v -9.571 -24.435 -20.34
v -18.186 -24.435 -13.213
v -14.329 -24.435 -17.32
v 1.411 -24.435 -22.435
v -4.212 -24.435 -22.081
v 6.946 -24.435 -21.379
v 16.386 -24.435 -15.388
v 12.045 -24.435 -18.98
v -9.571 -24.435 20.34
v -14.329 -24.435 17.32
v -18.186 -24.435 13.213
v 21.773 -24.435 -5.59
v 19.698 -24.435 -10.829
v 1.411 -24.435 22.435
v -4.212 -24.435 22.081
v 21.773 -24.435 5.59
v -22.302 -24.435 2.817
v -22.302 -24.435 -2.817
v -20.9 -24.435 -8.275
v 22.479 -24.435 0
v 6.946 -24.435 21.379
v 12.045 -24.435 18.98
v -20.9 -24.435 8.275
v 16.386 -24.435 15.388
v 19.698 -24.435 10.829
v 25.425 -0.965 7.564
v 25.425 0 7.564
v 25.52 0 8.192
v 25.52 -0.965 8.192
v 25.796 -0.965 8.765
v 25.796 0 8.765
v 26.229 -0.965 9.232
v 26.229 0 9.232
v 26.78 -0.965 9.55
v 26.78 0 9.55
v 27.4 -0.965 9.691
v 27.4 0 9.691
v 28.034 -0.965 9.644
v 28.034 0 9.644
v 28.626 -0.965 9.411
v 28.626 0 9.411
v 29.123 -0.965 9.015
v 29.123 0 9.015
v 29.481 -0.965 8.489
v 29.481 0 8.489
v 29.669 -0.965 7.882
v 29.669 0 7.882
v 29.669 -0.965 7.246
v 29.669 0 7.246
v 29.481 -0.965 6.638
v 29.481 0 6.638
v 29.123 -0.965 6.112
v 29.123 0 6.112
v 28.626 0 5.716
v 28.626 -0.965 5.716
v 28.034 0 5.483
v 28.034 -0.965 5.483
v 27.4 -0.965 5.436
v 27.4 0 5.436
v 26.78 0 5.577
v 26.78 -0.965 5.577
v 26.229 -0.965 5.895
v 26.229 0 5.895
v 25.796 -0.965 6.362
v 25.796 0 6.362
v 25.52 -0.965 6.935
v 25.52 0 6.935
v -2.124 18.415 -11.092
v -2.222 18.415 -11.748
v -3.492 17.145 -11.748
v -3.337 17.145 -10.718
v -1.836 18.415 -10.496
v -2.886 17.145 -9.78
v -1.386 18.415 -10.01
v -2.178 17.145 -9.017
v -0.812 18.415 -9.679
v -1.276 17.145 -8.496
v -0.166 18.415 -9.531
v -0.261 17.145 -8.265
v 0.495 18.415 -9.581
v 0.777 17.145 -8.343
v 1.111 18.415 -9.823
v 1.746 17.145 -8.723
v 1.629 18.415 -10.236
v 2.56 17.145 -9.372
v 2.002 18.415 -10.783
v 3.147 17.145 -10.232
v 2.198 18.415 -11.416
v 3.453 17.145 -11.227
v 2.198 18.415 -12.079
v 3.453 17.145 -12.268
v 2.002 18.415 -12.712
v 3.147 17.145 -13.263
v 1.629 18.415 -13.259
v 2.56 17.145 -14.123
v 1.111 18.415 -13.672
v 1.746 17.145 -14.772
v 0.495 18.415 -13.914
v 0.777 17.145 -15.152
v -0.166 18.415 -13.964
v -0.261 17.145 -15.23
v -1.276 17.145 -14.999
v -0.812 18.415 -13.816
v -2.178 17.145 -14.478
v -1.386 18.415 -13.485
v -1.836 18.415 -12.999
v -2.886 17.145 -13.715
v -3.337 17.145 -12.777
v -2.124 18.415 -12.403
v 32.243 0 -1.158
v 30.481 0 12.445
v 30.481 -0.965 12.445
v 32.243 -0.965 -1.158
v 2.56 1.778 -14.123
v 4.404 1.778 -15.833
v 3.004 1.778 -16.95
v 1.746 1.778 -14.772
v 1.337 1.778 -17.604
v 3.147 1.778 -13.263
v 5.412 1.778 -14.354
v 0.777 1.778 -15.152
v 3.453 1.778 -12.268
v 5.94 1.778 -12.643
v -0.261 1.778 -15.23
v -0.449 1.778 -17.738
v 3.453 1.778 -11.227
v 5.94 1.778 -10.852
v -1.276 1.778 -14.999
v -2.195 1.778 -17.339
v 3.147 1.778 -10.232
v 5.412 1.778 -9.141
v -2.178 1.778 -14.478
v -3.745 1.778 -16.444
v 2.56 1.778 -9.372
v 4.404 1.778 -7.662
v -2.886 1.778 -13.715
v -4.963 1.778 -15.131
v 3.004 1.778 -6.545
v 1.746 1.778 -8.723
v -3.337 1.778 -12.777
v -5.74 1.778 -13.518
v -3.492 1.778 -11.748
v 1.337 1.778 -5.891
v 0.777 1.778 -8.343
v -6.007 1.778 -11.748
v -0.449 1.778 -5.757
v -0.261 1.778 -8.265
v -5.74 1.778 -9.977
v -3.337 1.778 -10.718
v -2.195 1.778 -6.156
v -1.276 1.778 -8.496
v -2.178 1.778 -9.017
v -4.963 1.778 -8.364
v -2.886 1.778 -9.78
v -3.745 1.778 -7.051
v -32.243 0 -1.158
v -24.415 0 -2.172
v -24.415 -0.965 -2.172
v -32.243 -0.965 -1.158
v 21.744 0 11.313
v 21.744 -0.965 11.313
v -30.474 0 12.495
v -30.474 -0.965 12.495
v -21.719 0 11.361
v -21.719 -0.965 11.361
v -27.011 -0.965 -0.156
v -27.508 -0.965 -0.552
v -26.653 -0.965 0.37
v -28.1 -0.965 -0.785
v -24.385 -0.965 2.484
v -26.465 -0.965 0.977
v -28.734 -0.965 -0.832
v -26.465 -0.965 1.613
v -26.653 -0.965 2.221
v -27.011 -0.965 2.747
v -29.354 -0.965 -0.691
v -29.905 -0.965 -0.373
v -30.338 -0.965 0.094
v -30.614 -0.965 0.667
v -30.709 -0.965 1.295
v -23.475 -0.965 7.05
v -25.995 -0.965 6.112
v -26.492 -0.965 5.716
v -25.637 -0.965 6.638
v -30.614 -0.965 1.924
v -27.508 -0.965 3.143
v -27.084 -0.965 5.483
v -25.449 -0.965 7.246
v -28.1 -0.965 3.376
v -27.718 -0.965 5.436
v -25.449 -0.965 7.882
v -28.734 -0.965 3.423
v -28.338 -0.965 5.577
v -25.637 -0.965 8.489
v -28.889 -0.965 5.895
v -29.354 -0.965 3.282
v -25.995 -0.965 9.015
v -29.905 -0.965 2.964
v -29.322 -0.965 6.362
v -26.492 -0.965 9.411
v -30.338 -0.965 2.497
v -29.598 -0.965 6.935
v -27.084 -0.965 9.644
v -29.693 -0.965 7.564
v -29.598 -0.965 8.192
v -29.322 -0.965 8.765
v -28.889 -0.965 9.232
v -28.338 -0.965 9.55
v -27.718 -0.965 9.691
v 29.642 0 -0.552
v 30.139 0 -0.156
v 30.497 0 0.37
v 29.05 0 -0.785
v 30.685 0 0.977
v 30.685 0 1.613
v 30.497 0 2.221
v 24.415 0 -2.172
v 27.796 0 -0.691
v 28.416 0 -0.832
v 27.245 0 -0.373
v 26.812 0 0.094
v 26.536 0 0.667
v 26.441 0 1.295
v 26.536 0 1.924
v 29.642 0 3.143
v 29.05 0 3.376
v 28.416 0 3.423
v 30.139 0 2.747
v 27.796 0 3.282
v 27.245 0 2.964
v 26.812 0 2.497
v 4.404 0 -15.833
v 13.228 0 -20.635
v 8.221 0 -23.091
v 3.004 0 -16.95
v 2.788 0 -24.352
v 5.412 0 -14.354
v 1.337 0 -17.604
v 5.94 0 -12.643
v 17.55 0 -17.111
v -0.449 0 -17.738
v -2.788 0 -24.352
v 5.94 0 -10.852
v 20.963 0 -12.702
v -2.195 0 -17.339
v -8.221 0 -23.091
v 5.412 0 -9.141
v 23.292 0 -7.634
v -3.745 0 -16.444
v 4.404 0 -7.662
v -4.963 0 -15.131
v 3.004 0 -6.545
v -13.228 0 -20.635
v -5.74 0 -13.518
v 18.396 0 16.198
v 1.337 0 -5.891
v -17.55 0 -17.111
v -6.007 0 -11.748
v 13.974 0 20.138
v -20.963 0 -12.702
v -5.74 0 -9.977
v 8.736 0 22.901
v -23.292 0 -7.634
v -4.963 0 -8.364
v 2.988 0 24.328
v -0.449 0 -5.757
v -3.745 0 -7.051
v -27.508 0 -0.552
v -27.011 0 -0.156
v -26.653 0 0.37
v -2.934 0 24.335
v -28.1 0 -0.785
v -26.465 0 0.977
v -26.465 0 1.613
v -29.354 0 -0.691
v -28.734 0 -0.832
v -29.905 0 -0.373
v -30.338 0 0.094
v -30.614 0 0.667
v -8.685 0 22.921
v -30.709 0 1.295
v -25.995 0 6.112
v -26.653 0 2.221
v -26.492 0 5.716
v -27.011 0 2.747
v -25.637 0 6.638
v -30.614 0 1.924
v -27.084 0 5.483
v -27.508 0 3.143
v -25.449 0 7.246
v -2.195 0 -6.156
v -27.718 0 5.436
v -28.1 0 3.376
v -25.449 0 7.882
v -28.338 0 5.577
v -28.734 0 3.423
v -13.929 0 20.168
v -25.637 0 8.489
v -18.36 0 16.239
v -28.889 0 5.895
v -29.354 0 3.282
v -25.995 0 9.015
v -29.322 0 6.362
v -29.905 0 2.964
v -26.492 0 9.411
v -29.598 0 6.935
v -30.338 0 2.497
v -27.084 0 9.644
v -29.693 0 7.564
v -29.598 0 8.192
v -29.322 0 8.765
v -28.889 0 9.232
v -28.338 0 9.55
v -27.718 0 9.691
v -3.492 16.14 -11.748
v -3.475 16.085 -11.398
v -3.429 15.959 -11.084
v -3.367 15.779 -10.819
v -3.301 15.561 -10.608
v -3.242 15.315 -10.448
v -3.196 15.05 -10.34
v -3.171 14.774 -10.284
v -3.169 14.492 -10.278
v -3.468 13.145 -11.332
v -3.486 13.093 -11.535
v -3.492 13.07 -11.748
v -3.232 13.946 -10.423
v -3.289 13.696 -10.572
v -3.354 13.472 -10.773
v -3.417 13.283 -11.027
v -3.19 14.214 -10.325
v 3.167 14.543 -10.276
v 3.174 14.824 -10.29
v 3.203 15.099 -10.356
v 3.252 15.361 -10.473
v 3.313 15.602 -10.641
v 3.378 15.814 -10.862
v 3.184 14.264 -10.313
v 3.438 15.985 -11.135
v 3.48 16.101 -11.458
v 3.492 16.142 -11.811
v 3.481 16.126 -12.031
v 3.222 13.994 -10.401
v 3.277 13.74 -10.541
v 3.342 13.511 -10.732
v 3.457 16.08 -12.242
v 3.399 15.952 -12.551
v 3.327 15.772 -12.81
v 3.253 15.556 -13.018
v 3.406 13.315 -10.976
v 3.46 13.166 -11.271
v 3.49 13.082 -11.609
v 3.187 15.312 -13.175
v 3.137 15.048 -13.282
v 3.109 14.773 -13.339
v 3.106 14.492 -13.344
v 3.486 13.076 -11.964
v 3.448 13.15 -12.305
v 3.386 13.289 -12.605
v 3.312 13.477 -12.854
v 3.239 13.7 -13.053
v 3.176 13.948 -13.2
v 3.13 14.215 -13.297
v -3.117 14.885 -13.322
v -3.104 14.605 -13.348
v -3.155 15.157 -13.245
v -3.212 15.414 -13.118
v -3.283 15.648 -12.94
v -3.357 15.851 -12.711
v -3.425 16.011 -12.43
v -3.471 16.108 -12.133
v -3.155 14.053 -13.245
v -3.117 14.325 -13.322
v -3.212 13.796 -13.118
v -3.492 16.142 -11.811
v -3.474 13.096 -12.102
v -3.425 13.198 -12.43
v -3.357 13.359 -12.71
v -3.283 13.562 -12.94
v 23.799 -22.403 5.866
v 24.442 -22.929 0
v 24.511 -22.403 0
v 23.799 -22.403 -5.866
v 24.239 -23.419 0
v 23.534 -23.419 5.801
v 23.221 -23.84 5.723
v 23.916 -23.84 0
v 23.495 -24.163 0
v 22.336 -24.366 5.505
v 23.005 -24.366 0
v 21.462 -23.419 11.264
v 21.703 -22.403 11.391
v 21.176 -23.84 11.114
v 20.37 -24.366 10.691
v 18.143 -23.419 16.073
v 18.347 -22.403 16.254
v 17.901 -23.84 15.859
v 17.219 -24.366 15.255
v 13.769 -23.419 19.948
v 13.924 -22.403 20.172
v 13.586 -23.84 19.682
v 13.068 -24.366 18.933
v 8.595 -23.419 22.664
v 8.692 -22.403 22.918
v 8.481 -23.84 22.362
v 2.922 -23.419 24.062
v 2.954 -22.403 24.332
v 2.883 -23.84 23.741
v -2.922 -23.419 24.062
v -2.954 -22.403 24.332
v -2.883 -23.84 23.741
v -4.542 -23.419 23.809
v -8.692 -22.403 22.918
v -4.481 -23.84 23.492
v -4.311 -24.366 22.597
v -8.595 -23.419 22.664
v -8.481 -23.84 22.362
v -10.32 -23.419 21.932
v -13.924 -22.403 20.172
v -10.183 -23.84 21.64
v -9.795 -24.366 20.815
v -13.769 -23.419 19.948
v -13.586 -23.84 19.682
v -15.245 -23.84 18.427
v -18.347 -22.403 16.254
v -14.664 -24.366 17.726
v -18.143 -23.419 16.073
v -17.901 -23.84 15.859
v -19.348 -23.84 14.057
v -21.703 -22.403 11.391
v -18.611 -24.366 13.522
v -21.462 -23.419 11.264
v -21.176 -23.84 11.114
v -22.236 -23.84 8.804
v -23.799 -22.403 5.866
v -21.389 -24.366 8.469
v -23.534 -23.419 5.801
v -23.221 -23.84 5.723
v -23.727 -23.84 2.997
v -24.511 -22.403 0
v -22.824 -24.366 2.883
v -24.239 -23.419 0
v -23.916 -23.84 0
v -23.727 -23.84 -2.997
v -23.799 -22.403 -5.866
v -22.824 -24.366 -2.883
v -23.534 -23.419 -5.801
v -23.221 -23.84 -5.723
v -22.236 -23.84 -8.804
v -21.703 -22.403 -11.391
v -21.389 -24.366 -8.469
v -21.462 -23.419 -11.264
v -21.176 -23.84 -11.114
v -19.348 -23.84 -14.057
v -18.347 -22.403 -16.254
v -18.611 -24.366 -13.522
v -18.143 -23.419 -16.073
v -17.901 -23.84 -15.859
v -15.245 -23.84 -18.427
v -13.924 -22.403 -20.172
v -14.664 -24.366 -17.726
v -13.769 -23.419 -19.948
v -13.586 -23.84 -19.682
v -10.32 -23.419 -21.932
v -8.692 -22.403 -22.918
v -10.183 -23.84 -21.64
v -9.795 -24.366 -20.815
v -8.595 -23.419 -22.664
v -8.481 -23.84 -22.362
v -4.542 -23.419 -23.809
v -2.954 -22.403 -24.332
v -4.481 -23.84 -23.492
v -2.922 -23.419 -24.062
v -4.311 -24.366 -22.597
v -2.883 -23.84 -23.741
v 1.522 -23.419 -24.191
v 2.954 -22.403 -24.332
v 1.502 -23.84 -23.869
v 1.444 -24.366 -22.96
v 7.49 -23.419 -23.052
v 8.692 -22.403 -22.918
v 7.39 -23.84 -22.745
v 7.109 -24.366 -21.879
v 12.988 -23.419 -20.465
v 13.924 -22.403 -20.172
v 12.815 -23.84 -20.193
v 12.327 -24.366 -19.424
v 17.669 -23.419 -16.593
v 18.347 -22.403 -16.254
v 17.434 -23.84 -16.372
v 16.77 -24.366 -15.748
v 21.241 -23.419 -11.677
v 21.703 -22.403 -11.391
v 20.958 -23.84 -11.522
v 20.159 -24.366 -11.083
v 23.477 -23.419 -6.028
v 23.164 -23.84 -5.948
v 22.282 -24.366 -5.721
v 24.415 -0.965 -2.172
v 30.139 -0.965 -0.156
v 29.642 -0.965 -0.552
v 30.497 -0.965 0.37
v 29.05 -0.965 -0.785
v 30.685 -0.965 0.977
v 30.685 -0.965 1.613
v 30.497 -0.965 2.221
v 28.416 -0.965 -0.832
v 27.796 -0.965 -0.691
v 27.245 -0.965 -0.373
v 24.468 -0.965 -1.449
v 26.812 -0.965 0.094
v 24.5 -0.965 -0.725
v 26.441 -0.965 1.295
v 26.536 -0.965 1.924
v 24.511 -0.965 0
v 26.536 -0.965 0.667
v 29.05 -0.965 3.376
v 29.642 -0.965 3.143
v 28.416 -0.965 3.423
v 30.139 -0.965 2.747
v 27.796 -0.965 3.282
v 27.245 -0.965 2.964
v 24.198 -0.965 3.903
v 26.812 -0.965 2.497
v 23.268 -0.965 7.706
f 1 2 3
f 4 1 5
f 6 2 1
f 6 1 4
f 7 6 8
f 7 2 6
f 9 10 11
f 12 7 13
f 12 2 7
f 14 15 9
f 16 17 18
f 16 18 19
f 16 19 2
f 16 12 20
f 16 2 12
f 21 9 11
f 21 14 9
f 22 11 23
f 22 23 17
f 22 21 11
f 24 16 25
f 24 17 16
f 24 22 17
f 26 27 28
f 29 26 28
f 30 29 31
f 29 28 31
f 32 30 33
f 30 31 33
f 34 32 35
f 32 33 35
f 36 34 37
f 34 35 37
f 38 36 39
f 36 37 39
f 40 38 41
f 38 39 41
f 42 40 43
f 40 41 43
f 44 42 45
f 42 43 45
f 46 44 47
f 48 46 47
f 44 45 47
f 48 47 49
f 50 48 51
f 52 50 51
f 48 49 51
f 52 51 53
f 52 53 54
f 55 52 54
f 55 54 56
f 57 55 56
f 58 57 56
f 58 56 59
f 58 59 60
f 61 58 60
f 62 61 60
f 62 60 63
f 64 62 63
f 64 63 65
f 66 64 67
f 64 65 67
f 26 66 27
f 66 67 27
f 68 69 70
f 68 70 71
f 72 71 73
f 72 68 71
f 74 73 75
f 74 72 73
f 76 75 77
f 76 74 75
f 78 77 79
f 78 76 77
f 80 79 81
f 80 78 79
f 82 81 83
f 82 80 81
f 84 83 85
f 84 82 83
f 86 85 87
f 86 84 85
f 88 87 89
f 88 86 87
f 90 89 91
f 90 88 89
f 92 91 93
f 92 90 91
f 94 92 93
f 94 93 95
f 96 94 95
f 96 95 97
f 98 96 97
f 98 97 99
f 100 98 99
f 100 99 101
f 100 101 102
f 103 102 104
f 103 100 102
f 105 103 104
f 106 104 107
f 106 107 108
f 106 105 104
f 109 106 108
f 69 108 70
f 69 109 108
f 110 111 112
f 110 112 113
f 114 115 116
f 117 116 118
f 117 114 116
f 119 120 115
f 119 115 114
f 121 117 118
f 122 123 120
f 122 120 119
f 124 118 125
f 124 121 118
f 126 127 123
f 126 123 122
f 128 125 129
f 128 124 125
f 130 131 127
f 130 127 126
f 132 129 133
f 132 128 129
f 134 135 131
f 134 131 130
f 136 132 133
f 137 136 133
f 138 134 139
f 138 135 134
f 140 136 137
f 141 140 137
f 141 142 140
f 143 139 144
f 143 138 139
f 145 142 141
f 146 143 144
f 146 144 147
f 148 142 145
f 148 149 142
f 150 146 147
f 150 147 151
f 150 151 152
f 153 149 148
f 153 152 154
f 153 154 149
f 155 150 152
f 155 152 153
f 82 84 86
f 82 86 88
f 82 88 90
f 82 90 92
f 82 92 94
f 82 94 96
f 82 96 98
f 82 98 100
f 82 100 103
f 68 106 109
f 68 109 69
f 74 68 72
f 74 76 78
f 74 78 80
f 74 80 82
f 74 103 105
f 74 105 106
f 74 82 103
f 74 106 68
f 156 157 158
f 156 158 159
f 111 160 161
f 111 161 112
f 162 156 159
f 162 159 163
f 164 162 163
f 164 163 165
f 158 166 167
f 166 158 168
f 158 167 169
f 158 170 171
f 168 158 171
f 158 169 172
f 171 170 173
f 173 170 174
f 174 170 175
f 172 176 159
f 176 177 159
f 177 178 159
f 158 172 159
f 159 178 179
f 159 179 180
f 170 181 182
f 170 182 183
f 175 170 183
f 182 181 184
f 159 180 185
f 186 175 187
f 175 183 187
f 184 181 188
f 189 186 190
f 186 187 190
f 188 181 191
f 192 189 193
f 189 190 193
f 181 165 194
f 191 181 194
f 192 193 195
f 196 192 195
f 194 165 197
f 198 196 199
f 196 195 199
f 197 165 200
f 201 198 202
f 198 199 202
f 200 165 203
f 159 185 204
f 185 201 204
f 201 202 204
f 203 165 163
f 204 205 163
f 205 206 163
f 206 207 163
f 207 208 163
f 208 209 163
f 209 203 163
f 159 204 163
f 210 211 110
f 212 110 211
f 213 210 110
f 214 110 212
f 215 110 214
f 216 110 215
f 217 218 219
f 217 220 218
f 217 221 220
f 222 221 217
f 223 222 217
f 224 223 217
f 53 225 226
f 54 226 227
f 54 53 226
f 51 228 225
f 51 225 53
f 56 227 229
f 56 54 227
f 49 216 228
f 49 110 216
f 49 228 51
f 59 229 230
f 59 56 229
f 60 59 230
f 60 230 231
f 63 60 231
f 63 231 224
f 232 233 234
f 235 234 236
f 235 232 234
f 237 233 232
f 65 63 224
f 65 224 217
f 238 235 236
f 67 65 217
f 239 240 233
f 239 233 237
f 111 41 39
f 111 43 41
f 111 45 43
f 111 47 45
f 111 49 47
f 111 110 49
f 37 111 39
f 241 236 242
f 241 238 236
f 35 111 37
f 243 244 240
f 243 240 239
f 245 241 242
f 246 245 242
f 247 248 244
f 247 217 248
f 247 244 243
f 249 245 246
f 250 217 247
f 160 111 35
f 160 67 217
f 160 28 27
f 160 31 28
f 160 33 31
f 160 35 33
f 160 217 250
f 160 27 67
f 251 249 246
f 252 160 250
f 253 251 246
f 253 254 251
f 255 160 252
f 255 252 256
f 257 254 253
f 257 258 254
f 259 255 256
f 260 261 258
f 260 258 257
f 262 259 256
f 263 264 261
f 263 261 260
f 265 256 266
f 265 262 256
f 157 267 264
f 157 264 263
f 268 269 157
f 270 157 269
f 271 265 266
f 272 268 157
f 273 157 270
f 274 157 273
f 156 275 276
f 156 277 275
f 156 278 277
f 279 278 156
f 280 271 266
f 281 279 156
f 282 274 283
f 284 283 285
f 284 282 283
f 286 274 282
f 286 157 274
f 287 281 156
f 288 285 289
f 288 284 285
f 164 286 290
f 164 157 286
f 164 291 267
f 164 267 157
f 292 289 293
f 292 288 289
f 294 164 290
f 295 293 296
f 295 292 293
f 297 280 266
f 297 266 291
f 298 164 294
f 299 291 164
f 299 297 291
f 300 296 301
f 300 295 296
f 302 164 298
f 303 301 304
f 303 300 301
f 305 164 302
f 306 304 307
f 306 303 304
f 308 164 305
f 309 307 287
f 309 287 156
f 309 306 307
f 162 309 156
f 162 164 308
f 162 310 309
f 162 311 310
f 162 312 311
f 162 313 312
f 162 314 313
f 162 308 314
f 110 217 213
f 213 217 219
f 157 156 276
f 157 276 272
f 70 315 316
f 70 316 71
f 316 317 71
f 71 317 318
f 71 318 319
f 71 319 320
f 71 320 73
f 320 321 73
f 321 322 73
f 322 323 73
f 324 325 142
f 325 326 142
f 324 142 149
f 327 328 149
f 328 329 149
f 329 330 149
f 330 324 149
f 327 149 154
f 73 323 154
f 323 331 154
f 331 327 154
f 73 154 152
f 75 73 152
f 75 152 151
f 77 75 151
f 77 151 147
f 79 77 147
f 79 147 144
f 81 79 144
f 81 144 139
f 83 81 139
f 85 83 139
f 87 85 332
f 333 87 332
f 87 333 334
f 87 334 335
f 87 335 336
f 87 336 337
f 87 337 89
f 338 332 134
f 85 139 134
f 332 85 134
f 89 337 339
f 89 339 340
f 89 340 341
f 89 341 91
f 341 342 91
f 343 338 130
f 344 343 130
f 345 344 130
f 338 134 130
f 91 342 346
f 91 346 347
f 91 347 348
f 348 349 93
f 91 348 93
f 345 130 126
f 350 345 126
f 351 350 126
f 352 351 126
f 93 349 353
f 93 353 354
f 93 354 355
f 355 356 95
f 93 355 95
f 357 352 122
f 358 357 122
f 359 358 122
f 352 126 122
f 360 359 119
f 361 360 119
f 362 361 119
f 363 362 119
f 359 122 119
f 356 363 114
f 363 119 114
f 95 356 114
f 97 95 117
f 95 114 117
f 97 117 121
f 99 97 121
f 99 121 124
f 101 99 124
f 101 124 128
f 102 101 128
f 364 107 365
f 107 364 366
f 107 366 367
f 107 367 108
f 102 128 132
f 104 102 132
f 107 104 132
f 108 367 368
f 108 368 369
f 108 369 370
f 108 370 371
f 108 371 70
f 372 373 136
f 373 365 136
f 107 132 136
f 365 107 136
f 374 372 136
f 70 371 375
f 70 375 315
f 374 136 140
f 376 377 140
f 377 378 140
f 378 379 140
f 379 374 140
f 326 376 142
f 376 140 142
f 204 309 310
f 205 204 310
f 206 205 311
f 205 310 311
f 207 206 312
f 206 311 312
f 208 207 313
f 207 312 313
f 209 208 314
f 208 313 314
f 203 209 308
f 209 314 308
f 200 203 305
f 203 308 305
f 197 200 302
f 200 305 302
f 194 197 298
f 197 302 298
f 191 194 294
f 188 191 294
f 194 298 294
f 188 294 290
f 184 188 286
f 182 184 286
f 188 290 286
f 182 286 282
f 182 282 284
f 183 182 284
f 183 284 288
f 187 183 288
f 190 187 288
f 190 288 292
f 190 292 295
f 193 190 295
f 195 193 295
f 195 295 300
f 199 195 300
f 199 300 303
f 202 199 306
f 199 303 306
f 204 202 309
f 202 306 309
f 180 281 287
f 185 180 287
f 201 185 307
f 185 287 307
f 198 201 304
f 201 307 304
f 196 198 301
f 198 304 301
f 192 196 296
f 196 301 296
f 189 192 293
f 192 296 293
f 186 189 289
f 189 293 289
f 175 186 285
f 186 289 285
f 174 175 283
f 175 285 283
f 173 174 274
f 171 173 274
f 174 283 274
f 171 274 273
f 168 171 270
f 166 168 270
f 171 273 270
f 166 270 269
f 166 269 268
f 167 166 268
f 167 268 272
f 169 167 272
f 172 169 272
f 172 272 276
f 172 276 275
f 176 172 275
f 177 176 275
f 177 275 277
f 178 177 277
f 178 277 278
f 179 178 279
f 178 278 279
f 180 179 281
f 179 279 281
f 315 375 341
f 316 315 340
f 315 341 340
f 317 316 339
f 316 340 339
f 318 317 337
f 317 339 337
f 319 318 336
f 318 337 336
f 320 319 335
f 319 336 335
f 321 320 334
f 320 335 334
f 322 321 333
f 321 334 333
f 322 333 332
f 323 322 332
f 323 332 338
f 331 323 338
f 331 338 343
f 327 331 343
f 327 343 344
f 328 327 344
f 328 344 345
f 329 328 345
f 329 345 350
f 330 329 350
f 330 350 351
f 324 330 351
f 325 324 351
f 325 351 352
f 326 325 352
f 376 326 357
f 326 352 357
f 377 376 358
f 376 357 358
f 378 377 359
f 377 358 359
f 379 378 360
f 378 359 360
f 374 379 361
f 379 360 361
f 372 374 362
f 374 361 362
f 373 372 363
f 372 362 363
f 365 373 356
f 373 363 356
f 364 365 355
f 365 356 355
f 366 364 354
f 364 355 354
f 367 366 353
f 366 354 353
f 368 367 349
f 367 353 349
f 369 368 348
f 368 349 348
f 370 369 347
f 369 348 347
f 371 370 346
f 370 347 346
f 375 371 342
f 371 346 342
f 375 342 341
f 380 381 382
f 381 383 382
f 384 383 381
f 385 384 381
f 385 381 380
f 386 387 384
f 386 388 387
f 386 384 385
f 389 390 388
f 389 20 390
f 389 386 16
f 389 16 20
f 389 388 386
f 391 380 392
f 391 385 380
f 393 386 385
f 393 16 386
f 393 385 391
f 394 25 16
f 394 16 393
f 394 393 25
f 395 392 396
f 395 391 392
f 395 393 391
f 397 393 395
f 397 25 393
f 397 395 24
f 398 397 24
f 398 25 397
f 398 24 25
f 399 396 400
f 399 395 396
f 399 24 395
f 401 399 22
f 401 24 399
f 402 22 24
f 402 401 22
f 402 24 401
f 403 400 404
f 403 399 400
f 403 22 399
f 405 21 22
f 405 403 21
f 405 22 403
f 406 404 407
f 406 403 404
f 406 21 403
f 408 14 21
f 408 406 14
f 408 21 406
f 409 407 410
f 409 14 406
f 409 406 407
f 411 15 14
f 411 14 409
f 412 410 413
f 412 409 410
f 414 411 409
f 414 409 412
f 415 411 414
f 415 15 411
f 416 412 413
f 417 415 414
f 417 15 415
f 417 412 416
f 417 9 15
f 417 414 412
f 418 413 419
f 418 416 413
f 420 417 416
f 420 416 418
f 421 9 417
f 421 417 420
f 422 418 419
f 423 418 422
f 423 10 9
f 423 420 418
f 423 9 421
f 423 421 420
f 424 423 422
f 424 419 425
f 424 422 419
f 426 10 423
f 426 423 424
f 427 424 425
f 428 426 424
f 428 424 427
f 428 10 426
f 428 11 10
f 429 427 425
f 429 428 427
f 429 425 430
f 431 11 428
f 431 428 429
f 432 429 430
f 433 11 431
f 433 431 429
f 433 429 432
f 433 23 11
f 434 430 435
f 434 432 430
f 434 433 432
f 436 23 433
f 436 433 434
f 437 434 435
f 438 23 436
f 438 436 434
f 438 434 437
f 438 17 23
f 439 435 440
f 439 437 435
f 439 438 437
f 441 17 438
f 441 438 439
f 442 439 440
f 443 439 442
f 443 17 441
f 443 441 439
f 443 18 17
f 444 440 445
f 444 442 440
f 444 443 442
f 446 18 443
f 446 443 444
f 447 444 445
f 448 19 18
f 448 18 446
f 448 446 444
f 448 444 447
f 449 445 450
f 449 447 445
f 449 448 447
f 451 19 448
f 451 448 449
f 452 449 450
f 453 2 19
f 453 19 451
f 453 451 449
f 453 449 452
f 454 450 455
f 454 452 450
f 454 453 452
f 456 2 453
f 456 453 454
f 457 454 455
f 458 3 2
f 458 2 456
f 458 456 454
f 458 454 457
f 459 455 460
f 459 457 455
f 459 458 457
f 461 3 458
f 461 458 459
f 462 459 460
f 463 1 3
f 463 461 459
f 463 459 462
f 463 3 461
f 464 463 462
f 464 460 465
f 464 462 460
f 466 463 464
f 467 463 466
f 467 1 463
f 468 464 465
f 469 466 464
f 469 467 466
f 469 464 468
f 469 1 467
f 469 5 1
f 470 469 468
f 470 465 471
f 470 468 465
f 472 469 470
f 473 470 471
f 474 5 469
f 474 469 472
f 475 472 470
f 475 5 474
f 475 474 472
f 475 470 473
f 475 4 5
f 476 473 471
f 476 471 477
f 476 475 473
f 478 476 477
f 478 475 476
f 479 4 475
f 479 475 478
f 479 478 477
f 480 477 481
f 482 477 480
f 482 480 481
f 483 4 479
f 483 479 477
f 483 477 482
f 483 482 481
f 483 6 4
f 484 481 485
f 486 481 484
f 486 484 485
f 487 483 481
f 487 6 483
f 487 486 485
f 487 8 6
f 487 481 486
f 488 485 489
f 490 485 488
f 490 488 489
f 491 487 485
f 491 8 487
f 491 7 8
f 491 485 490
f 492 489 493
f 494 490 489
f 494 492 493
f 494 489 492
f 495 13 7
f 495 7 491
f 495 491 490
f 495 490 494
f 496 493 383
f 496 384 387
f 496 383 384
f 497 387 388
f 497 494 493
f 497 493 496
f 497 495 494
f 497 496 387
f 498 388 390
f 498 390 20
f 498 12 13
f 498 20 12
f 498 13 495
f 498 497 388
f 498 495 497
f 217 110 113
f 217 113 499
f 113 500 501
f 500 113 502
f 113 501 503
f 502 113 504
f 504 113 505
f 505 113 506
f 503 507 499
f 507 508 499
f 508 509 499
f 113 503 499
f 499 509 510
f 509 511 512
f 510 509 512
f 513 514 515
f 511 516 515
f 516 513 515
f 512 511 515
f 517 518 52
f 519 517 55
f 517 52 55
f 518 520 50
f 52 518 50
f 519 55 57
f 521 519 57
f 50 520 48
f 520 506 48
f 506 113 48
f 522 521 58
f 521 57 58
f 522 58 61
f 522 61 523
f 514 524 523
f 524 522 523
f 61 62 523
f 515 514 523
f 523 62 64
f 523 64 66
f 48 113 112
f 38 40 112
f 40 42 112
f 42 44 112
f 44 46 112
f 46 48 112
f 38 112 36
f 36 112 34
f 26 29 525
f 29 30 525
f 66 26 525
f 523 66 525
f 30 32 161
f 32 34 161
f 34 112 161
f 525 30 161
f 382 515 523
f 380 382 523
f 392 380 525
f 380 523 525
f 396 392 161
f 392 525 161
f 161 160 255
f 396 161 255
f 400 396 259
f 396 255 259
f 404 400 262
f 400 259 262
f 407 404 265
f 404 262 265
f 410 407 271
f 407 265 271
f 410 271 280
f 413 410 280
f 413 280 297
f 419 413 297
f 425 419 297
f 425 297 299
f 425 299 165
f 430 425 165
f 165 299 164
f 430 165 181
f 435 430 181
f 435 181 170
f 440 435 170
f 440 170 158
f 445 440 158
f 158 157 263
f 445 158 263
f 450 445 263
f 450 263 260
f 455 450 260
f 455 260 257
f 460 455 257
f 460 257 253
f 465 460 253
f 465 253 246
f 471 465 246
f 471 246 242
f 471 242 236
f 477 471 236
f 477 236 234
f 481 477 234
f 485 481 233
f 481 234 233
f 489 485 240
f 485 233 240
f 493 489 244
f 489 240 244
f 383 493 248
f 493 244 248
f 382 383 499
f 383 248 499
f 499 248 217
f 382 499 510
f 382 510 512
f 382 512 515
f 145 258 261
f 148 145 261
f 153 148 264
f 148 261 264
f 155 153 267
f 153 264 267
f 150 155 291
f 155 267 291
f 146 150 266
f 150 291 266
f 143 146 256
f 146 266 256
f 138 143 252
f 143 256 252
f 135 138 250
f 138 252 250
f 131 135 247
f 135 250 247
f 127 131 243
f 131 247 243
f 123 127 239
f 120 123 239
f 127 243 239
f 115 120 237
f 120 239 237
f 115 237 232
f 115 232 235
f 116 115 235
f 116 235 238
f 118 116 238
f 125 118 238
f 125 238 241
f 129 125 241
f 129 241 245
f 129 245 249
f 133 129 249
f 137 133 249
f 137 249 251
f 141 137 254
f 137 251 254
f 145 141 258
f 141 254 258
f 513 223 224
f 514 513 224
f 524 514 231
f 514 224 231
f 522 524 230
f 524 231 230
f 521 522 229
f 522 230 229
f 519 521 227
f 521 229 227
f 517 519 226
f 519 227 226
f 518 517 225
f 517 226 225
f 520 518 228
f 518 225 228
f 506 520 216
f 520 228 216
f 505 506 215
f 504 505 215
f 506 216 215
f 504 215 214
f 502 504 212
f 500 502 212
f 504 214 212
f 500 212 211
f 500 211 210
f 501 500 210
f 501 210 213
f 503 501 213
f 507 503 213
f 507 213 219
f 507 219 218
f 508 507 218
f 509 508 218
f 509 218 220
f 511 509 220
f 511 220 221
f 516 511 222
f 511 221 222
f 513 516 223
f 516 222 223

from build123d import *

# Parameters (mm, degrees)
F0_R      = 24.511
F1_DEPTH  = 24.4348
F2_R      = 3.4925
F3_DEPTH  = 18.415
F4_R      = 6.0071
F5_DEPTH  = 1.778
F6_SIZE   = 1.27
F7_R      = 1.5367
F8_DEPTH  = 12.7
F9_R      = 2.1336
F10_DEPTH = 0.9652
F11_R     = 2.032


with BuildPart() as f1:
    # F0 (on Front) → F1 (new body)
    with BuildSketch(Plane.XZ):
        Circle(F0_R)
    extrude(amount=F1_DEPTH)

    # F2 (on face) → F3 (join)
    with BuildSketch(Plane(origin=(0, 0, 0), x_dir=(-1, 0, 0), z_dir=(0, 1, 0))):
        with Locations((0, -11.7475)):
            Circle(F2_R)
    extrude(amount=F3_DEPTH)

    # F4 (on face) → F5 (join)
    with BuildSketch(Plane(origin=(0, 0, 0), x_dir=(-1, 0, 0), z_dir=(0, 1, 0))):
        with Locations((0, -11.7475)):
            Circle(F4_R)
    extrude(amount=F5_DEPTH)

    # F6
    f6_edges = [f1.edges().sort_by_distance(p)[0] for p in [
        (3.4925, 18.415, -11.7475),
    ]]
    chamfer(f6_edges, length=F6_SIZE)

    # F7 (on Right) → F8 (cut, symmetric)
    with BuildSketch(Plane.YZ):
        with Locations((14.605, -11.811)):
            Circle(F7_R)
    extrude(amount=F8_DEPTH, both=True, mode=Mode.SUBTRACT)

    # F9 (on face) → F10 (join)
    with BuildSketch(Plane(origin=(0, 0, 0), x_dir=(-1, 0, 0), z_dir=(0, 1, 0))):
        with BuildLine():
            ThreePointArc((21.7190408618, 11.3610028186), (24.0387512815, 4.788272948), (24.414607206, -2.1716528208))
            Line((24.414607206, -2.1716528208), (32.2426542084, -1.1577105466))
            Line((32.2426542084, -1.1577105466), (30.4742566429, 12.4950383448))
            Line((30.4742566429, 12.4950383448), (21.7190408618, 11.3610028186))
        make_face()
        with Locations((28.575, 1.2954)):
            Circle(F9_R, mode=Mode.SUBTRACT)
        with Locations((27.559, 7.5635930411)):
            Circle(F9_R, mode=Mode.SUBTRACT)
        with BuildLine():
            ThreePointArc((-24.414607206, -2.1716528208), (-24.044022755, 4.7617319075), (-21.7440723776, 11.3130207036))
            Line((-21.7440723776, 11.3130207036), (-30.4807820952, 12.4446591976))
            Line((-30.4807820952, 12.4446591976), (-32.2426542084, -1.1577105466))
            Line((-32.2426542084, -1.1577105466), (-24.414607206, -2.1716528208))
        make_face()
        with Locations((-28.575, 1.2954)):
            Circle(F9_R, mode=Mode.SUBTRACT)
        with Locations((-27.559, 7.5635930411)):
            Circle(F9_R, mode=Mode.SUBTRACT)
    extrude(amount=-F10_DEPTH)

    # F11
    f11_edges = [f1.edges().sort_by_distance(p)[0] for p in [
        (-24.511, -24.4348, 0),
    ]]
    fillet(f11_edges, radius=F11_R)


solid = f1.part
